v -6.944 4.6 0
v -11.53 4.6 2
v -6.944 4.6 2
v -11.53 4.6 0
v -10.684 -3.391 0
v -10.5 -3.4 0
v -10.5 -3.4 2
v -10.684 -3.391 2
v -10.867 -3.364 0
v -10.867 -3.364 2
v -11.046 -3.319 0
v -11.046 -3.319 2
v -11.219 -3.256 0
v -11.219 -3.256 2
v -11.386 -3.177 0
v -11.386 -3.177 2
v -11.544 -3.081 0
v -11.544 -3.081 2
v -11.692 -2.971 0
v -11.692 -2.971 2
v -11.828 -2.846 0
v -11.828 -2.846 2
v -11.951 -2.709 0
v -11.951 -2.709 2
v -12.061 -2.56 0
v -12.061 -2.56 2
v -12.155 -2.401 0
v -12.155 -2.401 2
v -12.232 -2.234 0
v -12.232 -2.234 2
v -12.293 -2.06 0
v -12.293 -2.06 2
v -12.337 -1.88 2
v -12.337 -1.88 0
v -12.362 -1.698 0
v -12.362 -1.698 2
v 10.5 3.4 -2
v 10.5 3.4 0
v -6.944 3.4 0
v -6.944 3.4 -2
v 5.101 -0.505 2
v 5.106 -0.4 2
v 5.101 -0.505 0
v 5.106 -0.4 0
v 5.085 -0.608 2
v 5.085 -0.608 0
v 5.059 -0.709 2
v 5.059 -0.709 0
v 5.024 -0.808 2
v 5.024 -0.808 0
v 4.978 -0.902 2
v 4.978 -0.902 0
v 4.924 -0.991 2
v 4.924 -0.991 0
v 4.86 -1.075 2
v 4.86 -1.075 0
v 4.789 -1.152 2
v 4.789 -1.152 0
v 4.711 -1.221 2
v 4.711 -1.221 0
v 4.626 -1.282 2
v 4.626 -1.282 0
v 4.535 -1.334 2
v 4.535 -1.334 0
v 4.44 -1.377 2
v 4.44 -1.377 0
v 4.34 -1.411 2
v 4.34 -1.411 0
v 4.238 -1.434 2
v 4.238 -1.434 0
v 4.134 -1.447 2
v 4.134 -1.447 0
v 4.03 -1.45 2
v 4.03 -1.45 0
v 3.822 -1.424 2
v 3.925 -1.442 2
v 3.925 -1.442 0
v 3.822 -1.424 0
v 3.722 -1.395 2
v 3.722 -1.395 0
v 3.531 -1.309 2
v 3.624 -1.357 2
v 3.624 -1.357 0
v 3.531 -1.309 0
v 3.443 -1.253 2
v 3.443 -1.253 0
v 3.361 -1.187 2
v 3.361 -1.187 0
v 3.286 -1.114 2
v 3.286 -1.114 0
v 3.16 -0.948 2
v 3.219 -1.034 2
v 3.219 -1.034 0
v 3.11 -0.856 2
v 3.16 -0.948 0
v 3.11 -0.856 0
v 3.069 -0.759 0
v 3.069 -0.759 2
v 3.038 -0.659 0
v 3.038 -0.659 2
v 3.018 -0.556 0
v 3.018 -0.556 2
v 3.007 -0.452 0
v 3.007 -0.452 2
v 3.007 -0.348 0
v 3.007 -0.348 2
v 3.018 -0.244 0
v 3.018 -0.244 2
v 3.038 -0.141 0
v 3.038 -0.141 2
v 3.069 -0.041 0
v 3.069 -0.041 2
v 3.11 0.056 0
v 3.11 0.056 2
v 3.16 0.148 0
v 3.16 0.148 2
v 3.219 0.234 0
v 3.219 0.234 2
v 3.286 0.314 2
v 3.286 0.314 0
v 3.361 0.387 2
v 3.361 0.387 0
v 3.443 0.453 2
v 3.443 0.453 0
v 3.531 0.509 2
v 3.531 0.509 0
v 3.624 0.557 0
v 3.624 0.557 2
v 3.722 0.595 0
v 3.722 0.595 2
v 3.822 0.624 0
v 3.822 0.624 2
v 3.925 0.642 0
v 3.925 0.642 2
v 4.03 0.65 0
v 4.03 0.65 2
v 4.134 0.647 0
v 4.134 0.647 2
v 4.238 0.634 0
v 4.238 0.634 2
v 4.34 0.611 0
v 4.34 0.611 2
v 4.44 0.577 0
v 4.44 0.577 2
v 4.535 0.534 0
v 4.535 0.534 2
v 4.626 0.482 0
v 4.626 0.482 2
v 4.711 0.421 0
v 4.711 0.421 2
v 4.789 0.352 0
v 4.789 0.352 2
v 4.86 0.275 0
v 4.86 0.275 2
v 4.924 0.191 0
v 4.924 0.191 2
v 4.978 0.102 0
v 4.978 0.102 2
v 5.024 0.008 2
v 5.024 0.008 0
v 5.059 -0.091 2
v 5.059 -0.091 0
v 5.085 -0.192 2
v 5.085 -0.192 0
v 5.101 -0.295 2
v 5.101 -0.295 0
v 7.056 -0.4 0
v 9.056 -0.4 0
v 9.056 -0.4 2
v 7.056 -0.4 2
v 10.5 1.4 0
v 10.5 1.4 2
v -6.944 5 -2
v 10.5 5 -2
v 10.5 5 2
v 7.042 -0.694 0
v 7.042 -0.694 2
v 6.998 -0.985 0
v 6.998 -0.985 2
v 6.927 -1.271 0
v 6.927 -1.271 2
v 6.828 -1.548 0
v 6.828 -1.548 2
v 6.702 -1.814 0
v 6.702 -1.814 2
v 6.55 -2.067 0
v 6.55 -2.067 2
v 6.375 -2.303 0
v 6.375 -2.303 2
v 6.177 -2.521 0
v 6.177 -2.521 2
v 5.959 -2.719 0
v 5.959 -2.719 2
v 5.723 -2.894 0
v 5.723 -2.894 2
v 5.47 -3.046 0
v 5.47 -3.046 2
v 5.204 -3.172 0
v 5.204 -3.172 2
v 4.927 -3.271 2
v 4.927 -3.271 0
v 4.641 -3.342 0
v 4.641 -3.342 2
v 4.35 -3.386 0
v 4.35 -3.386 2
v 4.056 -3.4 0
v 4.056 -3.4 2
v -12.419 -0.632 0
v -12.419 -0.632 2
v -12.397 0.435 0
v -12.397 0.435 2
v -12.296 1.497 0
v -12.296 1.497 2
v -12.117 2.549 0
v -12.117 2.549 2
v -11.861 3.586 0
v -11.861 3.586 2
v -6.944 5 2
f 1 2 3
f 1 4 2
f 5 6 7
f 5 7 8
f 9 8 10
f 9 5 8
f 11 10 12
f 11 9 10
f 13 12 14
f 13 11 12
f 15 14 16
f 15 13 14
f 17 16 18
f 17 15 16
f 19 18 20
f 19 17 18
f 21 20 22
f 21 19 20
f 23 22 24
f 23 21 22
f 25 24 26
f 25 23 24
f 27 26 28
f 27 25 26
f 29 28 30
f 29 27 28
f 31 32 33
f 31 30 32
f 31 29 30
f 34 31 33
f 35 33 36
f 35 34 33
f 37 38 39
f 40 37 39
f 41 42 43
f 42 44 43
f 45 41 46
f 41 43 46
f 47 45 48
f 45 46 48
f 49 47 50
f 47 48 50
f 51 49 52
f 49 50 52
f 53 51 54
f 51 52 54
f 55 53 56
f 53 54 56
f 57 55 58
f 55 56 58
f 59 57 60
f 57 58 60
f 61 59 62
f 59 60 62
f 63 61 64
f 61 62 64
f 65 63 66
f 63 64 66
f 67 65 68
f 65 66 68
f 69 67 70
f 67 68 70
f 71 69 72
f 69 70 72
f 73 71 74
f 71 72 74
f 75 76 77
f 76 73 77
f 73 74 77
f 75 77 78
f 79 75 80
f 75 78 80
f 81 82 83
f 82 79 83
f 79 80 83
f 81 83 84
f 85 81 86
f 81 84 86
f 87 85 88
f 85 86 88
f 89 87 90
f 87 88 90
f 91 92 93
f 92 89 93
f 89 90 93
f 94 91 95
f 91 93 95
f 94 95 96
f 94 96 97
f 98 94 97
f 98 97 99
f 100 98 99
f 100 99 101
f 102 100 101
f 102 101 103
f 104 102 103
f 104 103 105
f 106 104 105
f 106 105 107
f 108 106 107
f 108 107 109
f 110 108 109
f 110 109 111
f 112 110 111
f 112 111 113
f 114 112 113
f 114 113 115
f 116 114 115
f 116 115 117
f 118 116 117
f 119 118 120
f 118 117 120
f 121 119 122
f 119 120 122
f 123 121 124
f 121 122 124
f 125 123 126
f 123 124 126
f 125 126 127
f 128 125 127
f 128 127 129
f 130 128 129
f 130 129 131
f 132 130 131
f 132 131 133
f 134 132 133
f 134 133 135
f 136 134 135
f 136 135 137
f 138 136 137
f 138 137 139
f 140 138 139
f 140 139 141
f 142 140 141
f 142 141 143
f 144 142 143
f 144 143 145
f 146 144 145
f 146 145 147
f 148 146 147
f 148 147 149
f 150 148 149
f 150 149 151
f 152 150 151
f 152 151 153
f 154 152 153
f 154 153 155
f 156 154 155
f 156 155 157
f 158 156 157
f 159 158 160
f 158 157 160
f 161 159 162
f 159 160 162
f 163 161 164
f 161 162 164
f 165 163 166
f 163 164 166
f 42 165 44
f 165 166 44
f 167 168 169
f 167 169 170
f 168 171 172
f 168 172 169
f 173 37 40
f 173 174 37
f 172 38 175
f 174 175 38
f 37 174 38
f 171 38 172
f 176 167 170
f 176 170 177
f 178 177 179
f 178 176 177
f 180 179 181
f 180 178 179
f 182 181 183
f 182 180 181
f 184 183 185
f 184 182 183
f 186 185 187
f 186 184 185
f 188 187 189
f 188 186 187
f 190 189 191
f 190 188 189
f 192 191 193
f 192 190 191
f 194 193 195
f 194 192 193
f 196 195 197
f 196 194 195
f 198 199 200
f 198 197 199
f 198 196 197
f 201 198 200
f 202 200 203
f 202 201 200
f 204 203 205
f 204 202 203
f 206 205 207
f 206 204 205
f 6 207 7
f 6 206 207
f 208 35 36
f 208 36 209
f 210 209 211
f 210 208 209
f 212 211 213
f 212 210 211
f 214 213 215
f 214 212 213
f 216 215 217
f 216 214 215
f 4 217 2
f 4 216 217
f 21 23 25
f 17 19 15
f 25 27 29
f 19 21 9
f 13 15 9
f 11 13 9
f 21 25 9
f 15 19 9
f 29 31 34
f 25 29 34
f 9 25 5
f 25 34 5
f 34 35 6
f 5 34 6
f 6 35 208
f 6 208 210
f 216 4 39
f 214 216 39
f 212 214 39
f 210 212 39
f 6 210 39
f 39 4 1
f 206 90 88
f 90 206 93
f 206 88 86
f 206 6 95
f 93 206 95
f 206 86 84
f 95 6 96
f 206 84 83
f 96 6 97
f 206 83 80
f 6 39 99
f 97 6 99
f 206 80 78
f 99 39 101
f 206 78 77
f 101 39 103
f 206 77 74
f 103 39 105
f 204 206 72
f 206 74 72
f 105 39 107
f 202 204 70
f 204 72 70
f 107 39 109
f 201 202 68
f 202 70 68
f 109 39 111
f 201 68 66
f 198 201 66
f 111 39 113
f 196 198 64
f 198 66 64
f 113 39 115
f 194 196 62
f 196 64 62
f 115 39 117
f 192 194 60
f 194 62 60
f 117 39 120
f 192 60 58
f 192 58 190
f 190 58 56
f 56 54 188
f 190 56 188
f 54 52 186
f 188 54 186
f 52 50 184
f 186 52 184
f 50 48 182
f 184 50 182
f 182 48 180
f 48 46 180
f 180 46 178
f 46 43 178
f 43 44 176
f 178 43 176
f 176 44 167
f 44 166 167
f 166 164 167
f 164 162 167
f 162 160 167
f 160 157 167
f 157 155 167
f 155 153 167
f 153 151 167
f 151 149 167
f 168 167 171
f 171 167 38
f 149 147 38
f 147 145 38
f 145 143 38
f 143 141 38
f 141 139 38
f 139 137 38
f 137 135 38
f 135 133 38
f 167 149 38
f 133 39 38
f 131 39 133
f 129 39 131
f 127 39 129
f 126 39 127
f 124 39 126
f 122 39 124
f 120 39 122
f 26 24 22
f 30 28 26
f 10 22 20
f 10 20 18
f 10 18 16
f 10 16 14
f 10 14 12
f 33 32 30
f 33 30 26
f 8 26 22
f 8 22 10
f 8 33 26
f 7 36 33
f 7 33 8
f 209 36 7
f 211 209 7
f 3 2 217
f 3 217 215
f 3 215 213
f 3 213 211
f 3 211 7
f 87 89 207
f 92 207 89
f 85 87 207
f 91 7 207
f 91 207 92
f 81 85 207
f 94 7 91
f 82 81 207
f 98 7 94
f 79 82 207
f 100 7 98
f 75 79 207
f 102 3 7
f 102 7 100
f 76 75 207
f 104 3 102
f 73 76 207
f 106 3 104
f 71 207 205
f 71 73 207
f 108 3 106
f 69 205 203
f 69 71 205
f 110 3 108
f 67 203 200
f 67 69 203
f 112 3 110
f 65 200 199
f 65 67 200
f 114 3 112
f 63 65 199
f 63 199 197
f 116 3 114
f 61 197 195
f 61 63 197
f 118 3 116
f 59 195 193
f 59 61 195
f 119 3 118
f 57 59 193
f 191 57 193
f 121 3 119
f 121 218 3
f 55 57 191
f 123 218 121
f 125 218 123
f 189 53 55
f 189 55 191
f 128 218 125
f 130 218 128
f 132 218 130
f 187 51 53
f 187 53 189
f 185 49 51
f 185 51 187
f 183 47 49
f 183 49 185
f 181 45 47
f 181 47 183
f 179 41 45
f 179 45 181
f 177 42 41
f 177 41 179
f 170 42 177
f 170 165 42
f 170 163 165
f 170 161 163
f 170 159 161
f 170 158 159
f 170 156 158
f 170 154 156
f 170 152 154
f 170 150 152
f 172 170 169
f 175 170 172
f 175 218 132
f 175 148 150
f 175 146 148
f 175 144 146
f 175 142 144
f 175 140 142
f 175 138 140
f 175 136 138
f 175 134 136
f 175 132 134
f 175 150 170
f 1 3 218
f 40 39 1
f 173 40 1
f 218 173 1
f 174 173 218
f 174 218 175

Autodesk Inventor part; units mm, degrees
ref_plane "YZ Plane" through (0, 0, 0) normal (1, 0, 0) x (0, 1, 0)
ref_plane "XZ Plane" through (0, 0, 0) normal (0, 1, 0) x (-1, 0, 0)
ref_plane "XY Plane" through (0, 0, 0) normal (0, 0, 1) x (1, 0, 0)
sketch "Sketch1" plane through (0, 0, 0) normal (0, 0, 1) x (1, 0, 0)
  circle A0 centre (4.056, -0.4) radius 1.05 projected
  line L0 (-10.5, -3.4) -> (-10.5, 3.4) projected
  line L1 (4.056, -3.4) -> (-10.5, -3.4) projected
  arc A1 (4.056, -3.4) -> (7.056, -0.4) centre (4.056, -0.4) ccw projected
  line L2 (9.056, -0.4) -> (7.056, -0.4) projected
  line L3 (10.5, 1.4) -> (9.056, -0.4) projected
  line L4 (10.5, 3.4) -> (10.5, 1.4) projected
  line L5 (-10.5, 3.4) -> (10.5, 3.4) projected
  point P0 (0, 0)
sketch "Sketch2" plane through (0, 0, 0) normal (0, 0, 1) x (1, 0, 0)
  arc A0 (-11.5298, 4.6) -> (-12.3624, -1.6977) centre (2.056, -0.4) ccw
  line L0 (4.056, -0.4) -> (2.056, -0.4) construction
  circle A1 centre (-10.944, 6.6) radius 2 construction
  line L1 (-11.5298, 4.6) -> (-8.944, 4.6)
  line L2 (-11.5298, 4.6) -> (4.056, -0.4) construction
  line L3 (4.056, -0.4) -> (-12.3624, -1.6977) construction
  circle A2 centre (-12.944, 6.0142) radius 2 construction
  line L4 (-12.944, 6.0142) -> (-11.5298, 4.6) construction
  line L5 (-12.944, 6.0142) -> (-10.944, 6.0142) construction
  line L6 (4.056, -3.4) -> (-10.5, -3.4) construction
  arc A3 (-12.3624, -1.6977) -> (-10.5, -3.4) centre (-10.5, -1.5301) ccw
  point P0 (0, 0)
  point P1 (-8.944, 6.6)
  dimension "d1" = 4
  dimension "d0" = 2
  dimension "d2" = 7
  dimension "d3" = 15
  dimension "d11" = 45
  dimension "d12" = 2
sketch "Sketch3" plane through (0, 0, 0) normal (0, 0, 1) x (1, 0, 0)
  arc A0 (-11.5298, 4.6) -> (-12.3624, -1.6977) centre (2.056, -0.4) ccw projected
  line L0 (-11.5298, 4.6) -> (-8.944, 4.6) projected
  line L1 (10.5, 5) -> (10.5, 1.4)
  line L2 (10.5, 3.4) -> (10.5, 1.4) construction
  circle A1 centre (4.056, -0.4) radius 1.05 projected
  line L3 (4.056, -3.4) -> (-10.5, -3.4) projected
  arc A2 (4.056, -3.4) -> (7.056, -0.4) centre (4.056, -0.4) ccw projected
  line L4 (9.056, -0.4) -> (7.056, -0.4) projected
  line L5 (10.5, 1.4) -> (9.056, -0.4) projected
  arc A3 (-12.3624, -1.6977) -> (-10.5, -3.4) centre (-10.5, -1.5301) ccw projected
  line L6 (-8.944, 4.6) -> (-6.944, 4.6)
  line L7 (-6.944, 4.6) -> (-6.944, 5)
  line L8 (-6.944, 5) -> (10.5, 5)
  line L9 (-10.5, 3.4) -> (10.5, 3.4) construction
  point P0 (0, 0)
  dimension "d18" = 1.6
  dimension "d19" = 2
extrude "Extrusion1" add sketch "Sketch3" along normal blind 2
sketch "Sketch4" plane through (0, 0, 0) normal (0, 0, -1) x (-1, 0, 0)
  arc A0 (12.3624, -1.6977) -> (11.5298, 4.6) centre (-2.056, -0.4) ccw projected
  line L0 (6.944, 4.6) -> (11.5298, 4.6) projected
  line L1 (-10.5, 1.4) -> (-10.5, 5) projected
  line L2 (-9.056, -0.4) -> (-10.5, 1.4) projected
  line L3 (-7.056, -0.4) -> (-9.056, -0.4) projected
  arc A1 (-7.056, -0.4) -> (-4.056, -3.4) centre (-4.056, -0.4) ccw projected
  line L4 (10.5, -3.4) -> (-4.056, -3.4) projected
  arc A2 (10.5, -3.4) -> (12.3624, -1.6977) centre (10.5, -1.5301) ccw projected
  circle A3 centre (-4.056, -0.4) radius 1.05 projected
  line L5 (6.944, 5) -> (6.944, 4.6) projected
  line L6 (-10.5, 5) -> (6.944, 5) projected
  line L7 (-10.5, 5) -> (6.944, 5) projected
  line L8 (-10.5, 1.4) -> (-10.5, 5) projected
  line L9 (6.944, 5) -> (-10.5, 5)
  line L10 (-10.5, 5) -> (-10.5, 3.4)
  line L11 (-10.5, 3.4) -> (6.944, 3.4)
  line L12 (6.944, 3.4) -> (6.944, 5)
  line L13 (-10.5, 1.4) -> (-10.5, 5) projected
extrude "Extrusion2" add sketch "Sketch4" along normal blind 2 contours L12 L11 L1 L6 L5
sketch "Sketch5" plane through (0, 0, 0) normal (0, 0, 1) x (1, 0, 0)
  circle A0 centre (-10.944, 6.6) radius 2 construction
  point P0 (0, 0)
equation "\"d12\" = d0"
properties part number "Capping_RotationGuide"
